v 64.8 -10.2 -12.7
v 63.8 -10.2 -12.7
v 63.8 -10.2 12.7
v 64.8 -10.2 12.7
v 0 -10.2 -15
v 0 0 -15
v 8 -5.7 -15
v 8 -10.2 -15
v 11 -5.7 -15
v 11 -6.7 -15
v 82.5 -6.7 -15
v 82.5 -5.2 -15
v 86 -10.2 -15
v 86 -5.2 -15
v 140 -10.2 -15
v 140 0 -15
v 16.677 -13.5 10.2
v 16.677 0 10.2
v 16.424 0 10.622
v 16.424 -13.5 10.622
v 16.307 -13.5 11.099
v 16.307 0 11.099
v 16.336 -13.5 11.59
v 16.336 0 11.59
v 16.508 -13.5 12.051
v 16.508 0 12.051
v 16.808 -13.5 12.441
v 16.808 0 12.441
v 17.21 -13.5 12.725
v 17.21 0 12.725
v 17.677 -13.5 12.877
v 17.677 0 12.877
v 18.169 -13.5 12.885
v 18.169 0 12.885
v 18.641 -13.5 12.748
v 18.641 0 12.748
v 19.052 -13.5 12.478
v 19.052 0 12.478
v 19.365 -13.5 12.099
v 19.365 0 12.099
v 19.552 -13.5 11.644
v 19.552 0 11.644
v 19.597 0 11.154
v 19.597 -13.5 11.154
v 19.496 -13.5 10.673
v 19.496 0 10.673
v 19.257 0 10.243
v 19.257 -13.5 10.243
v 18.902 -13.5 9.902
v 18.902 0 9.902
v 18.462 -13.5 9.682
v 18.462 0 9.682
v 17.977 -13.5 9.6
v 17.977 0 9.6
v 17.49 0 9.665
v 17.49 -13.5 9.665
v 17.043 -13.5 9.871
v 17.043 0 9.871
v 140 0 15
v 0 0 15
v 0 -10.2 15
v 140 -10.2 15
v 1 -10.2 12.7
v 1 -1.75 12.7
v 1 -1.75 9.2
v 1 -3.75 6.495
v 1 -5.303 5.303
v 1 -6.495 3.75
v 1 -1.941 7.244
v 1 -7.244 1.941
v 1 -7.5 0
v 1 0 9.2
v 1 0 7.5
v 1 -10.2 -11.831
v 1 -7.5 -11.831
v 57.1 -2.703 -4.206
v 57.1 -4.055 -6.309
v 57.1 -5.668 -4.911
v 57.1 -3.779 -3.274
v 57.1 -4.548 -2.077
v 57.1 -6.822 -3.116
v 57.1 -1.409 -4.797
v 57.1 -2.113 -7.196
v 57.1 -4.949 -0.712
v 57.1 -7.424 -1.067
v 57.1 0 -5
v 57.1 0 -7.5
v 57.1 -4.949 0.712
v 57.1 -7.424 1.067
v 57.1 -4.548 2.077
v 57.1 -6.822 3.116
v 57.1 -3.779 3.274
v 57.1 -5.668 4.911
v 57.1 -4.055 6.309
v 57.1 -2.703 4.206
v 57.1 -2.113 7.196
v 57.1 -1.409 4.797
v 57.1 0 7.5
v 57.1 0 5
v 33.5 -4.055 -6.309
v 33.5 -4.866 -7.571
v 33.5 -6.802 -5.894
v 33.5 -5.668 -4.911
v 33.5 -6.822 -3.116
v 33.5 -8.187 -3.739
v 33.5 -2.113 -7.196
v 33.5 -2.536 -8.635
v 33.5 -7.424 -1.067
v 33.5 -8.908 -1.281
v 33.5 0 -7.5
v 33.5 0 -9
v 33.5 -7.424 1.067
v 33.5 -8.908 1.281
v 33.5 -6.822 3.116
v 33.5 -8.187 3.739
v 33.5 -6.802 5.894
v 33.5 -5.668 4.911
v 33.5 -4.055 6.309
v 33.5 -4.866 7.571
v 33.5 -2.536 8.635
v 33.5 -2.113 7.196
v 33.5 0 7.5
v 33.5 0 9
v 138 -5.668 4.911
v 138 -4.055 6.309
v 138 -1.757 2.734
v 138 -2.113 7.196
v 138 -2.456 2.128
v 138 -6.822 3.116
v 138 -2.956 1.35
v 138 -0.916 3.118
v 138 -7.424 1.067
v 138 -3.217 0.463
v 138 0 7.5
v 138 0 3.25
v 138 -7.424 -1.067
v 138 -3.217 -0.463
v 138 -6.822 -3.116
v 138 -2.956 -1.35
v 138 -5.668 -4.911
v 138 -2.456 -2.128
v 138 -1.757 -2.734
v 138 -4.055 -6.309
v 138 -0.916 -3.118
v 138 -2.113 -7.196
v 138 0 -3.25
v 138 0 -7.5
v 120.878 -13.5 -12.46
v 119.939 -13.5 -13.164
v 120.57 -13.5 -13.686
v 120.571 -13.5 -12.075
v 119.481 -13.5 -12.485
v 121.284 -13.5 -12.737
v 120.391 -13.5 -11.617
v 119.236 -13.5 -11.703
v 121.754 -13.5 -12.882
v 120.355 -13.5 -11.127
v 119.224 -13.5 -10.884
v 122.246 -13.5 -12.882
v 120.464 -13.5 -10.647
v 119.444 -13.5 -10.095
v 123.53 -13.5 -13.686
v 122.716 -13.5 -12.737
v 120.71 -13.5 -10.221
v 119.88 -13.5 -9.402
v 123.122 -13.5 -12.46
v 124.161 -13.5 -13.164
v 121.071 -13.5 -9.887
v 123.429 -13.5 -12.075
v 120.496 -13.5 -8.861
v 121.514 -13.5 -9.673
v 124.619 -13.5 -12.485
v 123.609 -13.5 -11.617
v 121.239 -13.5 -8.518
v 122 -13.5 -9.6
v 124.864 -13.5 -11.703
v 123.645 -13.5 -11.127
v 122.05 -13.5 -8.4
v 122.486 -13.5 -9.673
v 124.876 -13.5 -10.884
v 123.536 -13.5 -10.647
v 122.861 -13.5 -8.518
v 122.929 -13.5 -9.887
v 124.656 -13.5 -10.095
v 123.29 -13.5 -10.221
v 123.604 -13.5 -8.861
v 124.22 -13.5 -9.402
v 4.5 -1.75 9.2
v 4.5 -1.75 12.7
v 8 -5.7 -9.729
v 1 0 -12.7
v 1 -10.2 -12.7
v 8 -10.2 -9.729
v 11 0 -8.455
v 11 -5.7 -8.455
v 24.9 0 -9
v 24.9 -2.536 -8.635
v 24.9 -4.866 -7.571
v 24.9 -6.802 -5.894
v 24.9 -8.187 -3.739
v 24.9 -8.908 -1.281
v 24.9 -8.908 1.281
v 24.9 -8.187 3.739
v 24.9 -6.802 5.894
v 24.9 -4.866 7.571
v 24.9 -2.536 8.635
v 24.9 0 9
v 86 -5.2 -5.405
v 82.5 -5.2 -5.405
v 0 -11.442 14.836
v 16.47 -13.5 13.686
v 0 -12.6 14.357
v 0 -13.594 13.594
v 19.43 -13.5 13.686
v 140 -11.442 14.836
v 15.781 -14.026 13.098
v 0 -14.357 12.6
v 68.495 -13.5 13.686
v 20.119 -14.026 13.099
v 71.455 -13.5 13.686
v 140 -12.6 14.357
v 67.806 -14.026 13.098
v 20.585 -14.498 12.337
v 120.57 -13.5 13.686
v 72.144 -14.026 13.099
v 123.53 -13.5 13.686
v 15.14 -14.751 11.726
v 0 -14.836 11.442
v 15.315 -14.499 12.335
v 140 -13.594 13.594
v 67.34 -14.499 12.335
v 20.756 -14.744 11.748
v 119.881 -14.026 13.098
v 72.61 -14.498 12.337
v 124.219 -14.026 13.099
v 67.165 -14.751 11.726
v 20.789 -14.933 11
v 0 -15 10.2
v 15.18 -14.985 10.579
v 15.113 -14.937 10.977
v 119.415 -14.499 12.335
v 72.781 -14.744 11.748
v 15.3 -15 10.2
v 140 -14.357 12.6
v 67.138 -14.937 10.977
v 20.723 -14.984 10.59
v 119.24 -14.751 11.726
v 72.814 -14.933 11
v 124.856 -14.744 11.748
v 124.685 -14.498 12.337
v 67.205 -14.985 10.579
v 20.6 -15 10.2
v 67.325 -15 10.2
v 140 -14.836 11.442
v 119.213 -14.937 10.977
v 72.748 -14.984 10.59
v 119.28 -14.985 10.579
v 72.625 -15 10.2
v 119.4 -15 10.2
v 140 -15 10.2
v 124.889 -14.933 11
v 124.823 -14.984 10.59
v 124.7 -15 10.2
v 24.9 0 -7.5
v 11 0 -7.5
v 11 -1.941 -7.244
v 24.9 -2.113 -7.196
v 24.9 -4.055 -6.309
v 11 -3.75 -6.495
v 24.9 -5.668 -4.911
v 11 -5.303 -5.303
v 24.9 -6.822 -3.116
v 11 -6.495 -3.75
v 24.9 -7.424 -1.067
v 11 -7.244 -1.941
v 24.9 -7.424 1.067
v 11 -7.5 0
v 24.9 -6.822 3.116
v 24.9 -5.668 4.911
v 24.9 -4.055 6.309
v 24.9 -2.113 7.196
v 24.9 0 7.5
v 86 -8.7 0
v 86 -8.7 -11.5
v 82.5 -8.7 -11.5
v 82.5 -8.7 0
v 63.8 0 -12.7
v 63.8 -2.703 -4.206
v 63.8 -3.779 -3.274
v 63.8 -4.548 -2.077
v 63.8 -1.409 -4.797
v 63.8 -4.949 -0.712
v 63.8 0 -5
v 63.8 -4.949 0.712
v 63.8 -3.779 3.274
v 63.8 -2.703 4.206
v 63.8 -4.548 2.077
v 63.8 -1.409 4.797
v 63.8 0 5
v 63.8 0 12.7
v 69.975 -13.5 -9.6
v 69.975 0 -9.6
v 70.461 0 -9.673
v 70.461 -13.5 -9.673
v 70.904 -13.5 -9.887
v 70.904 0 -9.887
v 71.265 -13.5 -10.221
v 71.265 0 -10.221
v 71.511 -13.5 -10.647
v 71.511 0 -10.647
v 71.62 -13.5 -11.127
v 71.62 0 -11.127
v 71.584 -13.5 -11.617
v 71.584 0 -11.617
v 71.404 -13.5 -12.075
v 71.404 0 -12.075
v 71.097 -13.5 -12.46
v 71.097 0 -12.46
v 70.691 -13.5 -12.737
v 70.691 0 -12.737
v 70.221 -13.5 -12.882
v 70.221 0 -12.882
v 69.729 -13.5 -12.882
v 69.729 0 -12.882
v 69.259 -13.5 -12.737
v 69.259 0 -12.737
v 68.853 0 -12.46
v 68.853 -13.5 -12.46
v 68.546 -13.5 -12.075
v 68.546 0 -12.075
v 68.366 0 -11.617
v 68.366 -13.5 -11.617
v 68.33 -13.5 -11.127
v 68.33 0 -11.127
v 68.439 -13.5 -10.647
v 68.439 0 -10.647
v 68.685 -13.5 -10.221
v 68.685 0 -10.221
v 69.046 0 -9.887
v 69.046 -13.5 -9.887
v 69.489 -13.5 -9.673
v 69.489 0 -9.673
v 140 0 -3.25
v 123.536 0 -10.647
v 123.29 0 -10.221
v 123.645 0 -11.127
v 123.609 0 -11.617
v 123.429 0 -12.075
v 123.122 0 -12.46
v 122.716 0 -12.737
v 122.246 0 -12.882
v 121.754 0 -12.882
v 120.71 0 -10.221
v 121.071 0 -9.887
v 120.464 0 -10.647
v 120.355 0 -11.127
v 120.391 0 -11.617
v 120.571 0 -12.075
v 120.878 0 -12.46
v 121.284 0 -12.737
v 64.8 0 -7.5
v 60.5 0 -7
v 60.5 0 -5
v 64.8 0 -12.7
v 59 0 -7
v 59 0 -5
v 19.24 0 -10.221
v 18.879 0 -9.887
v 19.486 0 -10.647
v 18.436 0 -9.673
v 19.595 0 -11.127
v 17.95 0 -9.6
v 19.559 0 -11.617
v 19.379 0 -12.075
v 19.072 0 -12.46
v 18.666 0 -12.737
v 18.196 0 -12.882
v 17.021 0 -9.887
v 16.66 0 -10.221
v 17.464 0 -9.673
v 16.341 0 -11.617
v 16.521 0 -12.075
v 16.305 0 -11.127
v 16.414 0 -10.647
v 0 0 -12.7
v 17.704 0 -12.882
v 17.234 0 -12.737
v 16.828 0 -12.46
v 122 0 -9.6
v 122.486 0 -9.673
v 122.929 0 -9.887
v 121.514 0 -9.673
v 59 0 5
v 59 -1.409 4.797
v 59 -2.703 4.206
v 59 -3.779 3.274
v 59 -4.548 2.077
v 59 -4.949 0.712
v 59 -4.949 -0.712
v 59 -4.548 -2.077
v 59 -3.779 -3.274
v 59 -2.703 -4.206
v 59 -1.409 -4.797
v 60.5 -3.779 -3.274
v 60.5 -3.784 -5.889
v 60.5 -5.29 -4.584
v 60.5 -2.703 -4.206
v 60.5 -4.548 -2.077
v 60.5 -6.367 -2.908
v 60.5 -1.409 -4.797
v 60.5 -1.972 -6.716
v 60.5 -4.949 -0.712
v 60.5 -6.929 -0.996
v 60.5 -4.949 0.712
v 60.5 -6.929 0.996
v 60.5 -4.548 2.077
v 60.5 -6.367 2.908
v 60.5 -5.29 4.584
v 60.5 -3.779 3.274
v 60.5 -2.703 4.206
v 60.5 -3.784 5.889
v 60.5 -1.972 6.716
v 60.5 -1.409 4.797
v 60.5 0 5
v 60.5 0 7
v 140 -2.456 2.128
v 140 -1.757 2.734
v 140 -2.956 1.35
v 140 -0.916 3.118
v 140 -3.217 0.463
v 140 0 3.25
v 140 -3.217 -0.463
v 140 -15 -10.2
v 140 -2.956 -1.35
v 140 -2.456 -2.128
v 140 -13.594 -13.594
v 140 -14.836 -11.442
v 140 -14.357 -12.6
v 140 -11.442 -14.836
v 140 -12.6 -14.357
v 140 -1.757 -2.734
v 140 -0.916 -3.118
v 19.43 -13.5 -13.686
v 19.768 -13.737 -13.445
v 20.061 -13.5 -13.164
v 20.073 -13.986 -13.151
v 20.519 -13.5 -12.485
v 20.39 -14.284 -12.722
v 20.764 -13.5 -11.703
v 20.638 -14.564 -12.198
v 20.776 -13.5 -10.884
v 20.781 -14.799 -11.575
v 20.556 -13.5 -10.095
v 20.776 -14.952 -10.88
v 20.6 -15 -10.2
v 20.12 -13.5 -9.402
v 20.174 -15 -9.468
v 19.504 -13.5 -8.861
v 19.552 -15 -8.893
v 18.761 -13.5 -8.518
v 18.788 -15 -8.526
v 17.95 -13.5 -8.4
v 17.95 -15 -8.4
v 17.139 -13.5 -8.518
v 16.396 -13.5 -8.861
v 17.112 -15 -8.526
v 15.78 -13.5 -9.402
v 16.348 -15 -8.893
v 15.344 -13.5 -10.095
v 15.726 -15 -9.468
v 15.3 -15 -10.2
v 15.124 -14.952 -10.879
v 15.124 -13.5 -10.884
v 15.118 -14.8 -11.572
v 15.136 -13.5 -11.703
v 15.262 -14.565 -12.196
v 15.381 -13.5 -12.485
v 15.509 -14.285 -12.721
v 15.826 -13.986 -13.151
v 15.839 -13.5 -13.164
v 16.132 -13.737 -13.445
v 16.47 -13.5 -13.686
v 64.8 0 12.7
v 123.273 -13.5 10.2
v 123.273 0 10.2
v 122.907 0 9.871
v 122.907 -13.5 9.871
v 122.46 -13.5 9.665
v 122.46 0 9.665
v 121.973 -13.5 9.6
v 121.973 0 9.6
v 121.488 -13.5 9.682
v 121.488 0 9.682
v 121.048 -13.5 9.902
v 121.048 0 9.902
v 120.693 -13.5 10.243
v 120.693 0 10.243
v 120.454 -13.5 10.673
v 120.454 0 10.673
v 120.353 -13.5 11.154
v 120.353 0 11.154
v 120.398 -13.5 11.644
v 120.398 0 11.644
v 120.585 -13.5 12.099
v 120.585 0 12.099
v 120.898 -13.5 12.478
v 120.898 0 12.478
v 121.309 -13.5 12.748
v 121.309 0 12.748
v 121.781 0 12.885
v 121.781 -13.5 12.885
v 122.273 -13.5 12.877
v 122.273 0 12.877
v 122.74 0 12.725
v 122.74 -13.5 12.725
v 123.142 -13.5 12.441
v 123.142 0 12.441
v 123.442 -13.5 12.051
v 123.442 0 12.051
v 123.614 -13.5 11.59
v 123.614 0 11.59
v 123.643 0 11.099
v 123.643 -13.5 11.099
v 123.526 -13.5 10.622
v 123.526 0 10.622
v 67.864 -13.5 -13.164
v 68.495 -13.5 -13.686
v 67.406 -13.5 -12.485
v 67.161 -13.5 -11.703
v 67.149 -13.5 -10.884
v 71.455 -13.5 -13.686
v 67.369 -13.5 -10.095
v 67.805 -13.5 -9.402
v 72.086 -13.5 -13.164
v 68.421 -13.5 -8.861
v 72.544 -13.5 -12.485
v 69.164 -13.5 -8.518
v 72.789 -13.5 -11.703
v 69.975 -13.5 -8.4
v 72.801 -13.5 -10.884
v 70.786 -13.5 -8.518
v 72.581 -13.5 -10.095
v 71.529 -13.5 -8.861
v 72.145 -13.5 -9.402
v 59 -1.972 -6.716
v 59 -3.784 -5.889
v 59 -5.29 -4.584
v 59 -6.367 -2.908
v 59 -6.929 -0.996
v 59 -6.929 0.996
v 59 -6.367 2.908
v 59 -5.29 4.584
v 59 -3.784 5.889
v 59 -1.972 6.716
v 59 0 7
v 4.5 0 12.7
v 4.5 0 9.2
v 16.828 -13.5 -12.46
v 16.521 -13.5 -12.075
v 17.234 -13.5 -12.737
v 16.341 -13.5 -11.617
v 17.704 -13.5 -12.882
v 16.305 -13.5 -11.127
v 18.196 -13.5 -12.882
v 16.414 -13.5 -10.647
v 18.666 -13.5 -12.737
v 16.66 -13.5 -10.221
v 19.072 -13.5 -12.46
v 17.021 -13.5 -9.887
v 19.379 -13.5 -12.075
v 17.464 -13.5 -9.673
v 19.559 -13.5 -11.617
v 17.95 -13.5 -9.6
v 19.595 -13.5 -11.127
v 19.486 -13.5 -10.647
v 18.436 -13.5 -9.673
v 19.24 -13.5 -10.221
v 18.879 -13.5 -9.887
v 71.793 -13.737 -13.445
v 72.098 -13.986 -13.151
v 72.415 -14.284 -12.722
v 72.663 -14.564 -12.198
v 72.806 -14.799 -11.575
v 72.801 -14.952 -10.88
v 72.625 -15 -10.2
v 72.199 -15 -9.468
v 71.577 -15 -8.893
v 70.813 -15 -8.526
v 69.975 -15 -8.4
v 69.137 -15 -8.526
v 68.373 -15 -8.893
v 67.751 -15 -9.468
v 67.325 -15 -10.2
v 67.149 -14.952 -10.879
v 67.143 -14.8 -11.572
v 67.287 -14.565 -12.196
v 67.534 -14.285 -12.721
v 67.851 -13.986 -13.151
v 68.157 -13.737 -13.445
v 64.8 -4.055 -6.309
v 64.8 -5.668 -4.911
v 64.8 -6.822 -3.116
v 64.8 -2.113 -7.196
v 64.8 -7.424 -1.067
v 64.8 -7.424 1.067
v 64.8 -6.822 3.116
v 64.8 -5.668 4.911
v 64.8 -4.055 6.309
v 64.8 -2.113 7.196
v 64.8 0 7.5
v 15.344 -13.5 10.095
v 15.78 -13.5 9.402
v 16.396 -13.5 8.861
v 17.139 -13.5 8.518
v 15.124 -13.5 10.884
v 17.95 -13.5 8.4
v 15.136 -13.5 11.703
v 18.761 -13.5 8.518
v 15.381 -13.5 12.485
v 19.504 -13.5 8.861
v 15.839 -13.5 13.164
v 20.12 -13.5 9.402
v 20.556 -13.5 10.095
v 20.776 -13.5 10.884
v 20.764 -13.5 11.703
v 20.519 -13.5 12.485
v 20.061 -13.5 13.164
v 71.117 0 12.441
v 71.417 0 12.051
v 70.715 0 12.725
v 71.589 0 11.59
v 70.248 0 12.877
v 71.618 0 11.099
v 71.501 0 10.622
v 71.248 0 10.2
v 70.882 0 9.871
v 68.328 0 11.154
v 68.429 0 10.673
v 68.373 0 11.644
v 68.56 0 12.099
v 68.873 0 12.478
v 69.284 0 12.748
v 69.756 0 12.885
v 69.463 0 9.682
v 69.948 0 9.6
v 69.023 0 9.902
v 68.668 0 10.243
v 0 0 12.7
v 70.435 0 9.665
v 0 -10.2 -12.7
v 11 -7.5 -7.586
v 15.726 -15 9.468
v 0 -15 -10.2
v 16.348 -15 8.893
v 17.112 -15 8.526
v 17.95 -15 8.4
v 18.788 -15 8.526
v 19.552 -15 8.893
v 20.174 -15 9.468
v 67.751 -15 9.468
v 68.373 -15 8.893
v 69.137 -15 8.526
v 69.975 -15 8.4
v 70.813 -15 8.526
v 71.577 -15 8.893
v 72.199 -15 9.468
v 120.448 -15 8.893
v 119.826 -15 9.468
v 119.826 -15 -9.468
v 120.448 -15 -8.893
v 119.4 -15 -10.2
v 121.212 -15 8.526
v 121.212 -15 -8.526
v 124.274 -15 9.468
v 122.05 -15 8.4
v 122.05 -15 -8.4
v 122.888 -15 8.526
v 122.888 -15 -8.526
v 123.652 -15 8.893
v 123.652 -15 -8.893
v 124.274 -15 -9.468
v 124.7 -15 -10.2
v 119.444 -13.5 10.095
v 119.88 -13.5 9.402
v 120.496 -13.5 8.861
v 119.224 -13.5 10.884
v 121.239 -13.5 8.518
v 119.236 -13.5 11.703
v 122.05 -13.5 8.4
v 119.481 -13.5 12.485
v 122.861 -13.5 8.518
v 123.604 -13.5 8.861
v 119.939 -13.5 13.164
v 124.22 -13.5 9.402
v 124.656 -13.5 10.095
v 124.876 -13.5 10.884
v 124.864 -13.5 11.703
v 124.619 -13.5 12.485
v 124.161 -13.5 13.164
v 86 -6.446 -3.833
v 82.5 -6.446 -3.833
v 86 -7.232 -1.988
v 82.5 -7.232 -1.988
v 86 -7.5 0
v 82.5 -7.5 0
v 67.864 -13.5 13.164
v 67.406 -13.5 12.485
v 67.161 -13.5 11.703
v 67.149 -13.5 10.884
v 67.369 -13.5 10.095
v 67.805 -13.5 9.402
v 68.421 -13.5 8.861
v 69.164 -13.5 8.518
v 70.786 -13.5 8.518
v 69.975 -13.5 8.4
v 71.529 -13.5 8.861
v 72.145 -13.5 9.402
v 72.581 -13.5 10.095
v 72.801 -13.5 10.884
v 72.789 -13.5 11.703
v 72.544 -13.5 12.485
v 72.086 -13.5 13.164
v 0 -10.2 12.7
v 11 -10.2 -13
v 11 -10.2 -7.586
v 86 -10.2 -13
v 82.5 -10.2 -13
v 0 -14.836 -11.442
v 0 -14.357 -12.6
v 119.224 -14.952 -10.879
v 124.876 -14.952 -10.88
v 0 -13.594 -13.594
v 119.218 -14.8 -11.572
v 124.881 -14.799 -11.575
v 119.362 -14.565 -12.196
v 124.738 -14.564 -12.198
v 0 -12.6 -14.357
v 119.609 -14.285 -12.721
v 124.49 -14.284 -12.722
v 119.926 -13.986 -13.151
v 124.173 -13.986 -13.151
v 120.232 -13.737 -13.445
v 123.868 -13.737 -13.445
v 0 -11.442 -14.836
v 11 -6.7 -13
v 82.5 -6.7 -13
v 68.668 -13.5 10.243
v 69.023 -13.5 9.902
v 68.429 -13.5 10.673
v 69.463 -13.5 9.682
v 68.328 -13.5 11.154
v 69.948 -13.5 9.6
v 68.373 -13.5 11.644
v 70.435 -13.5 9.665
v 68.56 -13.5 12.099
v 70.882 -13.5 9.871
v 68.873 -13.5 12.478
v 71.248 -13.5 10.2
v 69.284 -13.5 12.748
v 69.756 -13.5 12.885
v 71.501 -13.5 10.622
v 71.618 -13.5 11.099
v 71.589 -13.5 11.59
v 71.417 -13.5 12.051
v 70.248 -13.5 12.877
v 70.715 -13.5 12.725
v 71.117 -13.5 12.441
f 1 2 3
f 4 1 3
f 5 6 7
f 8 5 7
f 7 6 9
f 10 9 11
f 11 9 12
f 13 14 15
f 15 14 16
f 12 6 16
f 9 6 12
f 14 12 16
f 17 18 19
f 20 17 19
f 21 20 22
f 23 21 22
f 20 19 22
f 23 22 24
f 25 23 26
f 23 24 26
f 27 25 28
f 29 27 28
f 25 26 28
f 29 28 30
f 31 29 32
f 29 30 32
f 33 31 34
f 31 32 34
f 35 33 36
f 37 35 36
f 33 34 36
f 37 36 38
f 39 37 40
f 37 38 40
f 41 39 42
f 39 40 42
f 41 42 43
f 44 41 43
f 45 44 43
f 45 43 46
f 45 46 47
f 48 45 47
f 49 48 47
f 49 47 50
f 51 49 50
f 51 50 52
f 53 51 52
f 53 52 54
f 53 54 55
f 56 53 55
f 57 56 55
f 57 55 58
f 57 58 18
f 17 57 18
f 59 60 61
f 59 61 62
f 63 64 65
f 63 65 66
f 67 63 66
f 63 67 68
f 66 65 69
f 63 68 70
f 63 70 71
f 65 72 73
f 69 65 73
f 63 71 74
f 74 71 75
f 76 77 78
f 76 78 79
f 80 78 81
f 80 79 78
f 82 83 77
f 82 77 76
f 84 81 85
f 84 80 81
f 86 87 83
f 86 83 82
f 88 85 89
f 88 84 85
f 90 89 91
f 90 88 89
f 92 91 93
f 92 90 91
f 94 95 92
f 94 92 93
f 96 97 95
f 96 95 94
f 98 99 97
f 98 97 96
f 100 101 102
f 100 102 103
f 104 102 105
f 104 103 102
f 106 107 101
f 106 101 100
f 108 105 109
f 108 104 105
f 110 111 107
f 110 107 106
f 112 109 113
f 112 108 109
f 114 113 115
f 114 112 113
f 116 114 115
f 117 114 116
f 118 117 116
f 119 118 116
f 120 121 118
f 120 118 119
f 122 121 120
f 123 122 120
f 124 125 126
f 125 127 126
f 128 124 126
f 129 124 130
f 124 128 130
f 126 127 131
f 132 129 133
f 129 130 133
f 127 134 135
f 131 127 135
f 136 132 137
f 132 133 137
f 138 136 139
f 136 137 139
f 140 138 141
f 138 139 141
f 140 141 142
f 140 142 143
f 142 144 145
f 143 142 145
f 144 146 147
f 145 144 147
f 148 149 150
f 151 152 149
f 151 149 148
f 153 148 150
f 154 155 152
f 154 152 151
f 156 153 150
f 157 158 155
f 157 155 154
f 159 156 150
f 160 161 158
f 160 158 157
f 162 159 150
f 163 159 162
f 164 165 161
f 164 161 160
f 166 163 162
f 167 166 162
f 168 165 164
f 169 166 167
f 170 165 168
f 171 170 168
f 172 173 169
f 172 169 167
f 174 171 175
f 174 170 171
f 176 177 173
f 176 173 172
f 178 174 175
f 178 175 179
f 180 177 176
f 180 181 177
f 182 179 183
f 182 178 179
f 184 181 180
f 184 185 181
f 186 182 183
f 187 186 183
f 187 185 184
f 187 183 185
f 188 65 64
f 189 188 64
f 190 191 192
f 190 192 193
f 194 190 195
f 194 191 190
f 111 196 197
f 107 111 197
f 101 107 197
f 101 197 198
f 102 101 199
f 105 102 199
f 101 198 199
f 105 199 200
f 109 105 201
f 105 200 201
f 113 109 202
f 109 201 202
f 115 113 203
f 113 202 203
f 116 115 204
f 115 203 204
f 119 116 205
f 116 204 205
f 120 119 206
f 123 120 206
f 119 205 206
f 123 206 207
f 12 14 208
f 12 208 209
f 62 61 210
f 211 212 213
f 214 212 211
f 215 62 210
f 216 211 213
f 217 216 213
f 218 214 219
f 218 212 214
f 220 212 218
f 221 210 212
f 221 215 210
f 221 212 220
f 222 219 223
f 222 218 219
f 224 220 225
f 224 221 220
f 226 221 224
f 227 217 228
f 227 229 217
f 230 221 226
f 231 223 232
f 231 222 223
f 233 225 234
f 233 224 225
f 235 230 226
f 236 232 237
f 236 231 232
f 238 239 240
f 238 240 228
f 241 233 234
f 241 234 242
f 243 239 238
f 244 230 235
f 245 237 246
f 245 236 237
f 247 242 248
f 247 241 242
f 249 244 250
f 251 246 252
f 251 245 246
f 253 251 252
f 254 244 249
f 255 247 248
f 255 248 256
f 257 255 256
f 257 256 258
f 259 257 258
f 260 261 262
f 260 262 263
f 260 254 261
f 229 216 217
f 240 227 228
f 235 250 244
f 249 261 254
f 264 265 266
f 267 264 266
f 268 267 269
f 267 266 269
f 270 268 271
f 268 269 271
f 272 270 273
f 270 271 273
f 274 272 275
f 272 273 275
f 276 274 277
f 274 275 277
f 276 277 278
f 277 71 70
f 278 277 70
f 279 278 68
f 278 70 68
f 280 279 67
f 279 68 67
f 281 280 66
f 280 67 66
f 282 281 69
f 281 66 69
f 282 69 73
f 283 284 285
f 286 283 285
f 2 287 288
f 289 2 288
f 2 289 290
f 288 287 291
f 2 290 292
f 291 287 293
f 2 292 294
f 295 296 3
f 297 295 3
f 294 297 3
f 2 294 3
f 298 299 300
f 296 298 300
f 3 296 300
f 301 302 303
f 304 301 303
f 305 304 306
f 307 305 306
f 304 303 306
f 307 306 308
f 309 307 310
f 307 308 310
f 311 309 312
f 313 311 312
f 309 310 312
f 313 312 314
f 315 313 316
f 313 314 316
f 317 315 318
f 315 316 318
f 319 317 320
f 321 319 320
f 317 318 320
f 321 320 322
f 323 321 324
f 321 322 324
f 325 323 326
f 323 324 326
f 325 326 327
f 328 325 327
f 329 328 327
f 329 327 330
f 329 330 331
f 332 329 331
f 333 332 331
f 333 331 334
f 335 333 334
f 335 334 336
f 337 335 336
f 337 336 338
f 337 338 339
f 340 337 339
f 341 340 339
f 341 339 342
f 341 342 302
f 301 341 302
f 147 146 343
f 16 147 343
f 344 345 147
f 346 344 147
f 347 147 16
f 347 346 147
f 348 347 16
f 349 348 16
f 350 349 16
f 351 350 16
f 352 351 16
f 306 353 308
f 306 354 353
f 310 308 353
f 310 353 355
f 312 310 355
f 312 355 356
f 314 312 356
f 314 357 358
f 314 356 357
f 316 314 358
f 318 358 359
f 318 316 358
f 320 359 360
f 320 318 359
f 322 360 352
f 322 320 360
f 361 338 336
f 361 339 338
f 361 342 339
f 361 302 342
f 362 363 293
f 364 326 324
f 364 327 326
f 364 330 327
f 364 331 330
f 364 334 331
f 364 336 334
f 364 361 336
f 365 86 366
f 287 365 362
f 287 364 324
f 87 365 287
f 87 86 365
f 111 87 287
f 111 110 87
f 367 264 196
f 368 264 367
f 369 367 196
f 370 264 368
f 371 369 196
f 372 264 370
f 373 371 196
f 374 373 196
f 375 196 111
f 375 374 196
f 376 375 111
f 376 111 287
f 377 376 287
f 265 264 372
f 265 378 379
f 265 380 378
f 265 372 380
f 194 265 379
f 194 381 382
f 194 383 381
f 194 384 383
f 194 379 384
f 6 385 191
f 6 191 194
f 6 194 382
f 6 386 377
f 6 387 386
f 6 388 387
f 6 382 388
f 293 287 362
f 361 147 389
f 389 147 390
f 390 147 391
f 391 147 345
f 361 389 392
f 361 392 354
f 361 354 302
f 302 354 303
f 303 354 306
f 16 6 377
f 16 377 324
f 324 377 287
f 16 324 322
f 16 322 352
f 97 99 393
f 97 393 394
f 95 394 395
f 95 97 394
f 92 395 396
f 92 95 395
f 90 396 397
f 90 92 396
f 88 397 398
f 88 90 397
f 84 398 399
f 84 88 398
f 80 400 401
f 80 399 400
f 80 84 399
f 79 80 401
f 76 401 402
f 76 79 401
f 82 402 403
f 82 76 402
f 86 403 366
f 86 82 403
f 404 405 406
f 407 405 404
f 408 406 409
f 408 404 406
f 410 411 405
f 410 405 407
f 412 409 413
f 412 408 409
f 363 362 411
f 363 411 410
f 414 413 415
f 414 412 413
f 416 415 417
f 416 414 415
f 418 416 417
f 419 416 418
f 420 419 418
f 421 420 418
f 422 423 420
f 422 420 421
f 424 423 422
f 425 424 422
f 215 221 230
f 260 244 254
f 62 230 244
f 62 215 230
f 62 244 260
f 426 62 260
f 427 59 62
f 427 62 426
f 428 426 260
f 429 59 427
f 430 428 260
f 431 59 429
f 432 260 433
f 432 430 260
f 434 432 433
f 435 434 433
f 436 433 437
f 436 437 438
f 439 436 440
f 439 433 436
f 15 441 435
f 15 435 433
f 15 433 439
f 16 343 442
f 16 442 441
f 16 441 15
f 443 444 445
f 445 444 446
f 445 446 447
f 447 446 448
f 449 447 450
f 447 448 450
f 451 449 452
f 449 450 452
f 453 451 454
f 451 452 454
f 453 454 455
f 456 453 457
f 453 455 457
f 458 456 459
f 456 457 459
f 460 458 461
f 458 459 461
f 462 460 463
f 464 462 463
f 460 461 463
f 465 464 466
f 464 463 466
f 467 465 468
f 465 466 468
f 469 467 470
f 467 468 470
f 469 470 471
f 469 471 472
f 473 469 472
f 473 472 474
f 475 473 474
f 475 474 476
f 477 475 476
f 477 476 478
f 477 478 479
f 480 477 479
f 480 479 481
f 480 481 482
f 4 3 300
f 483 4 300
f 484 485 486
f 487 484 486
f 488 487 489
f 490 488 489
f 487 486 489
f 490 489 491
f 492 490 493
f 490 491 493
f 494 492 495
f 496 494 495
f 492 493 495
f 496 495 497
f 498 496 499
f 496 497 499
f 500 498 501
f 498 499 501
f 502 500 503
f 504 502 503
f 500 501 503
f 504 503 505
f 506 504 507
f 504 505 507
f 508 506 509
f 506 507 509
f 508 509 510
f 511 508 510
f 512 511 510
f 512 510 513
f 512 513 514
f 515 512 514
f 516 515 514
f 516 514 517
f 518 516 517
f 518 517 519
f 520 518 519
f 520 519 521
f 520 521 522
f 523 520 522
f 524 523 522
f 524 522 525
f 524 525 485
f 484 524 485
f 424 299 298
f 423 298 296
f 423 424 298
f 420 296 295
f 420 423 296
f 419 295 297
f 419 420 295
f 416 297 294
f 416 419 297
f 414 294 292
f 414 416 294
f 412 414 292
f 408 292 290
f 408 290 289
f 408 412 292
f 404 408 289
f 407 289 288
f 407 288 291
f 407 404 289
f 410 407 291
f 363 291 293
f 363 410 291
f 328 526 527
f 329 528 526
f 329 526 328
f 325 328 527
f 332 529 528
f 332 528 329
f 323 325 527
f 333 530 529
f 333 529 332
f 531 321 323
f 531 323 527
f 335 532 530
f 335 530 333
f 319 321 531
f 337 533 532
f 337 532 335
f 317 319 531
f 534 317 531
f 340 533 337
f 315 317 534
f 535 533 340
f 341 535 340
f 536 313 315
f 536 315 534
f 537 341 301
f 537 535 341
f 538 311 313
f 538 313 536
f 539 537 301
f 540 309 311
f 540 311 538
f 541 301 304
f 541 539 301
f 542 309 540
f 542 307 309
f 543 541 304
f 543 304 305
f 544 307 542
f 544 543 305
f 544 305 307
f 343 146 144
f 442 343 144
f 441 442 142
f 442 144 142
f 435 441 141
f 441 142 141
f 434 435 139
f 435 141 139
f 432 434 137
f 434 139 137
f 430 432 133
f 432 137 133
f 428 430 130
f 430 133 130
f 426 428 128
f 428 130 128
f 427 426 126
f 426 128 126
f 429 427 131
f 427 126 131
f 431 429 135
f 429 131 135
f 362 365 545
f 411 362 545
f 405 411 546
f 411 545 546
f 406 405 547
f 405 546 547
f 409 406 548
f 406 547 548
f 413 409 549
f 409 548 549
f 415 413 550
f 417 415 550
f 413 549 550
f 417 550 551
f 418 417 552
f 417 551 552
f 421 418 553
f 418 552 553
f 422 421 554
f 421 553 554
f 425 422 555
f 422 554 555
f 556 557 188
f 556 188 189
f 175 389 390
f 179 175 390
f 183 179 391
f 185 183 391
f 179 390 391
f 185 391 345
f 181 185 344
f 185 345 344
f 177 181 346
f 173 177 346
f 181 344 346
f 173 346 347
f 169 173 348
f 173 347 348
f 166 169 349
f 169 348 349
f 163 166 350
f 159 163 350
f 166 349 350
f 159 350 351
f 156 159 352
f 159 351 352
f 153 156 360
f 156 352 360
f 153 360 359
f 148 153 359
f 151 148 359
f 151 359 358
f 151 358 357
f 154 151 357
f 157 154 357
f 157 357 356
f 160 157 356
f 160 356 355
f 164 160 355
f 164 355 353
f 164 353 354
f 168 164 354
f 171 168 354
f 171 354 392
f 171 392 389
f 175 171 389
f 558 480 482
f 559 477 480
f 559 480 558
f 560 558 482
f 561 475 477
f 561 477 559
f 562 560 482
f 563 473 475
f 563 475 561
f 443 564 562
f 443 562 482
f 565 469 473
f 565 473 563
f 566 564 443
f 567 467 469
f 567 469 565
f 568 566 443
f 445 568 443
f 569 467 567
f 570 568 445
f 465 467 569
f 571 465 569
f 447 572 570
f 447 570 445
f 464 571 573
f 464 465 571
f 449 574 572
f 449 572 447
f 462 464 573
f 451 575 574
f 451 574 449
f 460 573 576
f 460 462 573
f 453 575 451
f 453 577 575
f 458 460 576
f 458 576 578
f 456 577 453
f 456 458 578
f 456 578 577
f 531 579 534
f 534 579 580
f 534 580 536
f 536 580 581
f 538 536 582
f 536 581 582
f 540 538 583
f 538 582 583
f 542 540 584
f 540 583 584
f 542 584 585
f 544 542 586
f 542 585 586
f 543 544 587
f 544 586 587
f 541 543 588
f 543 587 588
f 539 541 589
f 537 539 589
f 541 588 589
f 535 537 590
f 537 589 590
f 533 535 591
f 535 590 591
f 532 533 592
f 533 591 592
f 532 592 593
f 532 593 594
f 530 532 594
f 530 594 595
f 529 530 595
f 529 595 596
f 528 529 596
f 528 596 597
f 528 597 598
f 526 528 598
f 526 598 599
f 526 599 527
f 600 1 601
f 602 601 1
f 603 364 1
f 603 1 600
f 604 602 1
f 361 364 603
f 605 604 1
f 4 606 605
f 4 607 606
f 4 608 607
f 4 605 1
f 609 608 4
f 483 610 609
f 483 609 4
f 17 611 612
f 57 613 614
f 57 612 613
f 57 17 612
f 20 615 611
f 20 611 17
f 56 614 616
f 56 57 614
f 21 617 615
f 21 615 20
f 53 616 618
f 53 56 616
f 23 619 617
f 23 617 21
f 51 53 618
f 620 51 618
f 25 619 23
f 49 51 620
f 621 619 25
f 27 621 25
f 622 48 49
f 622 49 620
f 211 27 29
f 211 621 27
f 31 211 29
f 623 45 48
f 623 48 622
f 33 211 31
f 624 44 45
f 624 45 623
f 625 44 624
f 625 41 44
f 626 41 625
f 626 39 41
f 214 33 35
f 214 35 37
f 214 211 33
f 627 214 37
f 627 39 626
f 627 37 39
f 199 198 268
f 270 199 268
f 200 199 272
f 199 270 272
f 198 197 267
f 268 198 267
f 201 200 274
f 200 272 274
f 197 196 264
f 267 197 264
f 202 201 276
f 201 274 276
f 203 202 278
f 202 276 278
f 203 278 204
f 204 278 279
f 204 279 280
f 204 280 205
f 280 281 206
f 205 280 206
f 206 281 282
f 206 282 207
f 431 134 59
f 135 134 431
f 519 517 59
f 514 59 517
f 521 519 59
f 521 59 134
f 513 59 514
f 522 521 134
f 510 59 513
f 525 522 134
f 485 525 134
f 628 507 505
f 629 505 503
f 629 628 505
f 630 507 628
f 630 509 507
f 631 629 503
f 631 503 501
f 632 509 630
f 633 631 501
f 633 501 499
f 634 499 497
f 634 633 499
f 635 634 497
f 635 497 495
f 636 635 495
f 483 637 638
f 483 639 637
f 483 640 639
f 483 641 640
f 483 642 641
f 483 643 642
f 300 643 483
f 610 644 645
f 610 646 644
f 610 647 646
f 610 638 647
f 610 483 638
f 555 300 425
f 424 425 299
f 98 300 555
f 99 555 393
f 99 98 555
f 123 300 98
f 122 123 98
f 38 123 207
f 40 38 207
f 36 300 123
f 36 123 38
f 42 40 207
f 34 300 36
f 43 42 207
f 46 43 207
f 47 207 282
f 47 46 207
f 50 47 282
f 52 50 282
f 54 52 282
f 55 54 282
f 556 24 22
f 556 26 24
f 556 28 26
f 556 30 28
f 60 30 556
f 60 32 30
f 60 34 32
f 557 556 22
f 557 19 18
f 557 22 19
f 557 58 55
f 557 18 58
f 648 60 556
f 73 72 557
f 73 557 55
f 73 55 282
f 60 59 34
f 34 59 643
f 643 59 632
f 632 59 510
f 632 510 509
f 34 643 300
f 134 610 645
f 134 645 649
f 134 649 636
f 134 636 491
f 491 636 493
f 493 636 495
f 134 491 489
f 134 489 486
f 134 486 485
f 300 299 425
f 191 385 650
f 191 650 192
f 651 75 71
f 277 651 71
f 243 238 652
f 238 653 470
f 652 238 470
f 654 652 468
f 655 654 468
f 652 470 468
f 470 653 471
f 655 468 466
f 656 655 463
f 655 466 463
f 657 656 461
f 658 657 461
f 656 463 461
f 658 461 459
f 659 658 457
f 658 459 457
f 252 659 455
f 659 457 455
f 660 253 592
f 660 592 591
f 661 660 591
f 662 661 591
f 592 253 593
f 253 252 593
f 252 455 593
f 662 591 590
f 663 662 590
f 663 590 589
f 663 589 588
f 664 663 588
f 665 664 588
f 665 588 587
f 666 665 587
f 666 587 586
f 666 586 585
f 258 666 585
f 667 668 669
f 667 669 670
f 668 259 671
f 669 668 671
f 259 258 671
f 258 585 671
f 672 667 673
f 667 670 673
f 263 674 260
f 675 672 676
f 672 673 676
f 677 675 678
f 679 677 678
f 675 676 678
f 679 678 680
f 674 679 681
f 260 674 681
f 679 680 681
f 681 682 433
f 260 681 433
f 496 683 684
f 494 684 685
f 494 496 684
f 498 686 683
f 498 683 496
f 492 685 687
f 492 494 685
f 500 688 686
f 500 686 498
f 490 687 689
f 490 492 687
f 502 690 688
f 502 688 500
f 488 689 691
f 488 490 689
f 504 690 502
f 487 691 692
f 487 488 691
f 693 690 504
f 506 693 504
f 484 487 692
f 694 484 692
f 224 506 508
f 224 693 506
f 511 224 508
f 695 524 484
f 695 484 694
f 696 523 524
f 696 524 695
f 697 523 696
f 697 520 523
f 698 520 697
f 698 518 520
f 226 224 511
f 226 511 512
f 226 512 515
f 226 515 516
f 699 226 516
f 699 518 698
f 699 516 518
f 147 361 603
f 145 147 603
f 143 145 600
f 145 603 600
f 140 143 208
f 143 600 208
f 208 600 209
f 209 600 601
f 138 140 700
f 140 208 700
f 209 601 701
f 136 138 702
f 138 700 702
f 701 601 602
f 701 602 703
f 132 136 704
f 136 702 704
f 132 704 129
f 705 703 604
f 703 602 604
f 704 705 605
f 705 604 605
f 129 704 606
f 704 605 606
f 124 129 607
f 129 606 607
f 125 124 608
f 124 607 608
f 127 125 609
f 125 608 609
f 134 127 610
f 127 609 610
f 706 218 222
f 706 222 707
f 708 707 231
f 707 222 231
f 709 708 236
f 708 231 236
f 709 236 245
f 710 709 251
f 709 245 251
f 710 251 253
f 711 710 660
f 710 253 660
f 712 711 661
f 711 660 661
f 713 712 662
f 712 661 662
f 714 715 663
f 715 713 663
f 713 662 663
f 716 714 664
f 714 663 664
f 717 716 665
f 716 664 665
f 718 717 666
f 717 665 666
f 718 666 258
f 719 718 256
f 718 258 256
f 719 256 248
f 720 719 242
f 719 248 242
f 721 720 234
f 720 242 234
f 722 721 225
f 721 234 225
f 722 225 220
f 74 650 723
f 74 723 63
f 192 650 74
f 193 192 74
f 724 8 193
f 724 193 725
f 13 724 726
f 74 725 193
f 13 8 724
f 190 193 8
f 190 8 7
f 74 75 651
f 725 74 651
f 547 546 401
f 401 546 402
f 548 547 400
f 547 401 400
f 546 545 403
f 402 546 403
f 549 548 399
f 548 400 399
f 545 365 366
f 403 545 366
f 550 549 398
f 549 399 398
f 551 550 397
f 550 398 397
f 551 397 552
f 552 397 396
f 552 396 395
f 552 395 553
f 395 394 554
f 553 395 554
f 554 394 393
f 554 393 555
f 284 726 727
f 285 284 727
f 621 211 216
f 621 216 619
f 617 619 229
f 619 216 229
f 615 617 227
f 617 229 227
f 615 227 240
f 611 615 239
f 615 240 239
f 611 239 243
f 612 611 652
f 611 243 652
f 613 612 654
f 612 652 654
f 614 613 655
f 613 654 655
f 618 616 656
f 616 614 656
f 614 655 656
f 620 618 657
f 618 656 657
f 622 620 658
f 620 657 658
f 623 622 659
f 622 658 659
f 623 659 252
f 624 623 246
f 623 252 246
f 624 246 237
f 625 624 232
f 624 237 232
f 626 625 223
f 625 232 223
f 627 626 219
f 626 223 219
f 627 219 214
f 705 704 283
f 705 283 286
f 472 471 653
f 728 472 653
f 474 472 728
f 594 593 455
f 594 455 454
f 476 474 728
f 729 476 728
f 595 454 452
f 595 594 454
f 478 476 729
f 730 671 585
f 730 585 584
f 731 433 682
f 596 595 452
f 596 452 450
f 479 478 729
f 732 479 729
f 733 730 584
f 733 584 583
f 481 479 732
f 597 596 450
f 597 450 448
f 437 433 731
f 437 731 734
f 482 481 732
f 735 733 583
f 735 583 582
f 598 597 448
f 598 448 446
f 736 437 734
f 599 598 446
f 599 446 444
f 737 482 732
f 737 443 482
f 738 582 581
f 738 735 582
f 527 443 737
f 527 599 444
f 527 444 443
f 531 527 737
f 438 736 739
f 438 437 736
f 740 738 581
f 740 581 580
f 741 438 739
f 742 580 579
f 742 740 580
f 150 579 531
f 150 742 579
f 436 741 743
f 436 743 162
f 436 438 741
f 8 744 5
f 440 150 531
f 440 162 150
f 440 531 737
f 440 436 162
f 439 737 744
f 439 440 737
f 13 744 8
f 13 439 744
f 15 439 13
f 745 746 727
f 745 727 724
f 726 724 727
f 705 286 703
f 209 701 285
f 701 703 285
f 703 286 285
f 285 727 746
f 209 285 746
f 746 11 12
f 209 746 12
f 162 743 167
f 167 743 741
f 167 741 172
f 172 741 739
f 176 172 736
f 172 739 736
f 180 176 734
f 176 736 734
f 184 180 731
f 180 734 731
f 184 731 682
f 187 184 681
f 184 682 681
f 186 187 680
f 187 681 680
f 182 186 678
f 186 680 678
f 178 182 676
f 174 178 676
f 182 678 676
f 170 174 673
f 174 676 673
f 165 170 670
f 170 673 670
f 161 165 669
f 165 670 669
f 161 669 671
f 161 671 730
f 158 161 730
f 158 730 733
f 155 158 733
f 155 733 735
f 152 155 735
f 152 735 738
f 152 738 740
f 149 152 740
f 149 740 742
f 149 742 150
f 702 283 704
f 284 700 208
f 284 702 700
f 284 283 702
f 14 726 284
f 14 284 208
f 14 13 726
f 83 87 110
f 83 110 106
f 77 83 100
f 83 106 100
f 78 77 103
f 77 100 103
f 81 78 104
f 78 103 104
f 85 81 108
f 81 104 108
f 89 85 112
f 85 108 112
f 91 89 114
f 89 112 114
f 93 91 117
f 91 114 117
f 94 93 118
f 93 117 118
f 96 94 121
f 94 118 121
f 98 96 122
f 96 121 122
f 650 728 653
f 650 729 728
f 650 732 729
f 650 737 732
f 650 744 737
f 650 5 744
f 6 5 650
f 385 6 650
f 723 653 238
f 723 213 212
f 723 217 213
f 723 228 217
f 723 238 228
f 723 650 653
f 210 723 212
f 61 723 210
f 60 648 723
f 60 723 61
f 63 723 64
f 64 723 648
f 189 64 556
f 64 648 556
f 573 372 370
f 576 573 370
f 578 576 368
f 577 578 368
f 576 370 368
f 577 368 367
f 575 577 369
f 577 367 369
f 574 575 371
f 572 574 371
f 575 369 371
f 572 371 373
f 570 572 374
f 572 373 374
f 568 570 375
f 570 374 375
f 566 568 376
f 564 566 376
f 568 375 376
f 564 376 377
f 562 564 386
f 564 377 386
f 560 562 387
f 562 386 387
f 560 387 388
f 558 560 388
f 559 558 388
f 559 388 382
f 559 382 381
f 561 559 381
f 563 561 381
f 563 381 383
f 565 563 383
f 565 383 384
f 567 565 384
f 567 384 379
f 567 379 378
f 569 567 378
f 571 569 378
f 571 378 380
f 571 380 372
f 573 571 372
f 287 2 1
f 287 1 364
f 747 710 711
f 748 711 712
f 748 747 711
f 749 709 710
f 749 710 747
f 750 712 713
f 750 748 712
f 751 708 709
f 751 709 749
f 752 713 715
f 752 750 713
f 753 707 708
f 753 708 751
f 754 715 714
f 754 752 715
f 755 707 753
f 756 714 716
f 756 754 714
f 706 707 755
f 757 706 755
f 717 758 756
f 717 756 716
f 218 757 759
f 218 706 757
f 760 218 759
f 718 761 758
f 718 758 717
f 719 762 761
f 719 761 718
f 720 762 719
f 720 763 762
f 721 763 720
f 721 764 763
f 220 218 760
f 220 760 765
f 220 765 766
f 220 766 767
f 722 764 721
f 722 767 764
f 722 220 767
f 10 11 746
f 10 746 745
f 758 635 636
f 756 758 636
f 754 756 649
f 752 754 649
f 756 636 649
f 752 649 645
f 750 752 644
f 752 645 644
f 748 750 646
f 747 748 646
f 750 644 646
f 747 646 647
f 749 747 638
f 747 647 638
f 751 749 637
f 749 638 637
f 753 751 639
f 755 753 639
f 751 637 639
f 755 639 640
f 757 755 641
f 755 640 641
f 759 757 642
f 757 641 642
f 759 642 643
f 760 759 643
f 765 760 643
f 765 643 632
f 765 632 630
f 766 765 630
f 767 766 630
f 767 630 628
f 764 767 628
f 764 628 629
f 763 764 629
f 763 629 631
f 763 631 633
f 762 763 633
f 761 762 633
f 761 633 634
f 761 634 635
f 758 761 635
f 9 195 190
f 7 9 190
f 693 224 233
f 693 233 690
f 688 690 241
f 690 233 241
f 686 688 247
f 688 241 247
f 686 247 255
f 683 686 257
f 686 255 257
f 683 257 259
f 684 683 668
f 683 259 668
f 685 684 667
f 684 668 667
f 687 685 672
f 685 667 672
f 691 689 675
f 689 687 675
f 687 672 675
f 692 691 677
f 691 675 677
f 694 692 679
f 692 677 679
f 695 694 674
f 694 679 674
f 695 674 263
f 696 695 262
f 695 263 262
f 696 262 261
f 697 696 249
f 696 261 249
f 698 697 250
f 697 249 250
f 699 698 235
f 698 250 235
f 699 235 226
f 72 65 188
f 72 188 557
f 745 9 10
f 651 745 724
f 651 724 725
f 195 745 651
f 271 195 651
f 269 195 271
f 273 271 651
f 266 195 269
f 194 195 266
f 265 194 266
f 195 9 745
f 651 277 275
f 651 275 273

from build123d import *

# Parameters (mm, degrees)
SKETCH2_W                 = 140
SKETCH2_H                 = 15
BASE_DEPTH                = 15
SKETCH3_R                 = 7.5
CENTER_CUT_DEPTH          = 142.598022585
SKETCH4_W                 = 1
SKETCH4_H                 = 25.4
ANTENNA_PCB_DEPTH         = 10.2
SKETCH14_W                = 3.5
SKETCH14_H                = 3.5
COAXIAL_CONNECTOR_DEPTH   = 3.5
LENS_START                = -23.9
SKETCH8_R                 = 9
LENS_DEPTH                = 8.6
PHOTODIODE_PCB_START      = -62.8
SKETCH10_W                = 25.4
SKETCH10_H                = 20.4
PHOTODIODE_PCB_DEPTH      = 1
FILLET1_R                 = 4.8
COAX_CONNECTOR_HOLE_START = -2
COAX_CONNECTOR_HOLE_DEPTH = 2
SKETCH16_W                = 12.7
SKETCH16_H                = 7.5
CUT_EXTRUDE2_DEPTH        = 10
BOSS_EXTRUDE1_REACH       = 143.598
CUT_EXTRUDE3_DEPTH        = 2.7
SKETCH19_R                = 1.65
CUT_EXTRUDE4_DEPTH        = 15
SKETCH20_R                = 2.85
CUT_EXTRUDE5_DEPTH        = 1.5
CUT_EXTRUDE6_REACH        = 145.962
SKETCH21_W                = 3
SKETCH21_H                = 4.5
SKETCH22_W                = 75
SKETCH22_H                = 3.5
CUT_EXTRUDE7_DEPTH        = 2
SKETCH24_W                = 3.5
SKETCH24_H                = 3.5
CUT_EXTRUDE8_DEPTH        = 15
CHAMFER2_SIZE             = 1.5
FILTER_MOUNT_START        = -56.1
FILTER_MOUNT_DEPTH        = 6.7
FILTER_SPACE_START        = -58
SKETCH9_R                 = 7
FILTER_SPACE_DEPTH        = 1.5


with BuildPart() as part:
    # Sketch2 → Base (new body)
    with BuildSketch(Plane(origin=(0, 0, 0), x_dir=(1, 0, 0), z_dir=(0, 1, 0))):
        with Locations((70, -7.5)):
            Rectangle(SKETCH2_W, SKETCH2_H)
        with Locations((70, 7.5)):
            Rectangle(SKETCH2_W, SKETCH2_H)
    extrude(amount=-BASE_DEPTH)

    # Sketch3 → Center_cut (cut, through all)
    with BuildSketch(Plane.ZY):
        Circle(SKETCH3_R)
    extrude(amount=-CENTER_CUT_DEPTH, mode=Mode.SUBTRACT)

    # Sketch4 → Antenna_PCB (cut)
    with BuildSketch(Plane(origin=(0, 0, 0), x_dir=(1, 0, 0), z_dir=(0, 1, 0))):
        with Locations((0.5, 0)):
            Rectangle(SKETCH4_W, SKETCH4_H)
    extrude(amount=-ANTENNA_PCB_DEPTH, mode=Mode.SUBTRACT)

    # Sketch14 → Coaxial_connector (cut)
    with BuildSketch(Plane.ZY.offset(-1)):
        with Locations((10.95, 0)):
            Rectangle(SKETCH14_W, SKETCH14_H)
    extrude(amount=-COAXIAL_CONNECTOR_DEPTH, mode=Mode.SUBTRACT)

    # Sketch8 → Lens (cut)
    with BuildSketch(Plane.ZY.offset(-1).offset(LENS_START)):
        Circle(SKETCH8_R)
    extrude(amount=-LENS_DEPTH, mode=Mode.SUBTRACT)

    # Sketch10 → Photodiode_PCB (cut)
    with BuildSketch(Plane.ZY.offset(-1).offset(PHOTODIODE_PCB_START)):
        Rectangle(SKETCH10_W, SKETCH10_H)
    extrude(amount=-PHOTODIODE_PCB_DEPTH, mode=Mode.SUBTRACT)

    # Fillet1
    fillet1_edges = [part.edges().sort_by_distance(p)[0] for p in [
        (70, -15, -15),
        (70, -15, 15),
    ]]
    fillet(fillet1_edges, radius=FILLET1_R)

    # Sketch15 → Coax_connector_hole (add)
    with BuildSketch(Plane(origin=(140, 0, 0), x_dir=(0, 0, -1), z_dir=(1, 0, 0)).offset(COAX_CONNECTOR_HOLE_START)):
        with BuildLine():
            ThreePointArc((-7.5, 0), (0, -7.5), (7.5, 0))
            Line((7.5, 0), (3.25, 0))
            ThreePointArc((3.25, 0), (0, -3.25), (-3.25, 0))
            Line((-3.25, 0), (-7.5, 0))
        make_face()
        with BuildLine():
            Line((11.25, -8), (11.25, 0))
            Line((11.25, 0), (7.5, 0))
            ThreePointArc((7.5, 0), (0, -7.5), (-7.5, 0))
            Line((-7.5, 0), (-11.25, 0))
            Line((-11.25, 0), (-11.25, -8))
            Line((-11.25, -8), (11.25, -8))
        make_face()
    extrude(amount=COAX_CONNECTOR_HOLE_DEPTH)

    # Sketch16 → Cut-Extrude2 (cut)
    with BuildSketch(Plane.ZY.offset(-1)):
        with Locations((-6.35, -3.75)):
            Rectangle(SKETCH16_W, SKETCH16_H)
    extrude(amount=-CUT_EXTRUDE2_DEPTH, mode=Mode.SUBTRACT)

    # Sketch17 → Boss-Extrude1 (add, up to next)
    with BuildSketch(Plane(origin=(0, 0, 0), x_dir=(1, 0, 0), z_dir=(0, 1, 0)), mode=Mode.PRIVATE) as boss_extrude1_sk1:
        Polygon((1, 12.7), (11, 8.455251838), (11, 12.7), align=None)
    boss_extrude1_tool1 = extrude(boss_extrude1_sk1.sketch, amount=-BOSS_EXTRUDE1_REACH, mode=Mode.PRIVATE) - part.part
    add(boss_extrude1_tool1.solids().sort_by_distance((7.666667, 0, -11.285084))[0])

    # Sketch18 → Cut-Extrude3 (cut)
    with BuildSketch(Plane(origin=(0, -7.5, 0), x_dir=(1, 0, 0), z_dir=(0, 1, 0))):
        Polygon((11, 8.455251838), (1, 12.7), (1, 11.830911698), (11, 7.586163536), align=None)
    extrude(amount=-CUT_EXTRUDE3_DEPTH, mode=Mode.SUBTRACT)

    # Sketch19 → Cut-Extrude4 (cut)
    with BuildSketch(Plane(origin=(0, 0, 0), x_dir=(1, 0, 0), z_dir=(0, 1, 0))):
        with Locations(Location((17.95, 11.25, 0), (0, 0, 270))):
            Circle(SKETCH19_R)
        with Locations(Location((122, 11.25, 0), (0, 0, 270))):
            Circle(SKETCH19_R)
        with Locations(Location((122, -11.25, 0), (0, 0, 39.521196359))):
            Circle(SKETCH19_R)
        with Locations(Location((17.95, -11.25, 0), (0, 0, 140.478803641))):
            Circle(SKETCH19_R)
        with Locations(Location((69.975, 11.25, 0), (0, 0, 270))):
            Circle(SKETCH19_R)
        with Locations(Location((69.975, -11.25, 0), (0, 0, 39.521196359))):
            Circle(SKETCH19_R)
    extrude(amount=-CUT_EXTRUDE4_DEPTH, mode=Mode.SUBTRACT)

    # Sketch20 → Cut-Extrude5 (cut)
    with BuildSketch(Plane.XZ.offset(15)):
        with Locations((17.95, 11.25)):
            Circle(SKETCH20_R)
        with Locations((122.05, 11.25)):
            Circle(SKETCH20_R)
        with Locations((122.05, -11.25)):
            Circle(SKETCH20_R)
        with Locations((17.95, -11.25)):
            Circle(SKETCH20_R)
        with Locations((69.975, 11.25)):
            Circle(SKETCH20_R)
        with Locations((69.975, -11.25)):
            Circle(SKETCH20_R)
    extrude(amount=-CUT_EXTRUDE5_DEPTH, mode=Mode.SUBTRACT)

    # Cut-Extrude6: up to this plane
    cut_extrude6_end = Plane(origin=(1, -15.002, -12.7), z_dir=(-0.3907311284892679, 0, 0.9205048534524428))
    # Sketch21 → Cut-Extrude6 (cut, up to the surface)
    with BuildSketch(Plane(origin=(0, 0, -15), x_dir=(-1, 0, 0), z_dir=(0, 0, -1)), mode=Mode.PRIVATE) as cut_extrude6_sk1:
        with Locations((-9.5, -7.95)):
            Rectangle(SKETCH21_W, SKETCH21_H)
    cut_extrude6_tool1 = split(extrude(cut_extrude6_sk1.sketch, amount=-CUT_EXTRUDE6_REACH, mode=Mode.PRIVATE), bisect_by=cut_extrude6_end, keep=Keep.BOTH, mode=Mode.PRIVATE)
    add(cut_extrude6_tool1.solids().sort_by_distance((9.5, -7.95, -15))[0], mode=Mode.SUBTRACT)

    # Sketch22 → Cut-Extrude7 (cut)
    with BuildSketch(Plane(origin=(0, 0, -15), x_dir=(-1, 0, 0), z_dir=(0, 0, -1))):
        with Locations((-48.5, -8.45)):
            Rectangle(SKETCH22_W, SKETCH22_H)
    extrude(amount=-CUT_EXTRUDE7_DEPTH, mode=Mode.SUBTRACT)

    # Sketch24 → Cut-Extrude8 (cut)
    with BuildSketch(Plane(origin=(0, 0, -15), x_dir=(-1, 0, 0), z_dir=(0, 0, -1))):
        with Locations((-84.25, -6.95)):
            Rectangle(SKETCH24_W, SKETCH24_H)
    extrude(amount=-CUT_EXTRUDE8_DEPTH, mode=Mode.SUBTRACT)

    # Chamfer2
    chamfer2_edges = [part.edges().sort_by_distance(p)[0] for p in [
        (84.25, -8.7, -13),
    ]]
    chamfer(chamfer2_edges, length=CHAMFER2_SIZE - 0.0001)  # a hair under: the kernel refuses the full size

    # Sketch25 → Filter_mount (add)
    with BuildSketch(Plane.ZY.offset(-1).offset(FILTER_MOUNT_START)):
        with BuildLine():
            ThreePointArc((0, -7.5), (5.303300859, -5.303300859), (7.5, 0))
            Line((7.5, 0), (5, 0))
            ThreePointArc((5, 0), (0, -5), (-5, 0))
            Line((-5, 0), (-7.5, 0))
            Line((-7.5, 0), (-7.5, -7.5))
            Line((-7.5, -7.5), (0, -7.5))
        make_face()
        with BuildLine():
            Line((7.5, -7.5), (7.5, 0))
            ThreePointArc((7.5, 0), (5.303300859, -5.303300859), (0, -7.5))
            Line((0, -7.5), (7.5, -7.5))
        make_face()
    extrude(amount=-FILTER_MOUNT_DEPTH)

    # Sketch9 → Filter_space (cut)
    with BuildSketch(Plane.ZY.offset(-1).offset(FILTER_SPACE_START)):
        Circle(SKETCH9_R)
    extrude(amount=-FILTER_SPACE_DEPTH, mode=Mode.SUBTRACT)


solid = part.part
